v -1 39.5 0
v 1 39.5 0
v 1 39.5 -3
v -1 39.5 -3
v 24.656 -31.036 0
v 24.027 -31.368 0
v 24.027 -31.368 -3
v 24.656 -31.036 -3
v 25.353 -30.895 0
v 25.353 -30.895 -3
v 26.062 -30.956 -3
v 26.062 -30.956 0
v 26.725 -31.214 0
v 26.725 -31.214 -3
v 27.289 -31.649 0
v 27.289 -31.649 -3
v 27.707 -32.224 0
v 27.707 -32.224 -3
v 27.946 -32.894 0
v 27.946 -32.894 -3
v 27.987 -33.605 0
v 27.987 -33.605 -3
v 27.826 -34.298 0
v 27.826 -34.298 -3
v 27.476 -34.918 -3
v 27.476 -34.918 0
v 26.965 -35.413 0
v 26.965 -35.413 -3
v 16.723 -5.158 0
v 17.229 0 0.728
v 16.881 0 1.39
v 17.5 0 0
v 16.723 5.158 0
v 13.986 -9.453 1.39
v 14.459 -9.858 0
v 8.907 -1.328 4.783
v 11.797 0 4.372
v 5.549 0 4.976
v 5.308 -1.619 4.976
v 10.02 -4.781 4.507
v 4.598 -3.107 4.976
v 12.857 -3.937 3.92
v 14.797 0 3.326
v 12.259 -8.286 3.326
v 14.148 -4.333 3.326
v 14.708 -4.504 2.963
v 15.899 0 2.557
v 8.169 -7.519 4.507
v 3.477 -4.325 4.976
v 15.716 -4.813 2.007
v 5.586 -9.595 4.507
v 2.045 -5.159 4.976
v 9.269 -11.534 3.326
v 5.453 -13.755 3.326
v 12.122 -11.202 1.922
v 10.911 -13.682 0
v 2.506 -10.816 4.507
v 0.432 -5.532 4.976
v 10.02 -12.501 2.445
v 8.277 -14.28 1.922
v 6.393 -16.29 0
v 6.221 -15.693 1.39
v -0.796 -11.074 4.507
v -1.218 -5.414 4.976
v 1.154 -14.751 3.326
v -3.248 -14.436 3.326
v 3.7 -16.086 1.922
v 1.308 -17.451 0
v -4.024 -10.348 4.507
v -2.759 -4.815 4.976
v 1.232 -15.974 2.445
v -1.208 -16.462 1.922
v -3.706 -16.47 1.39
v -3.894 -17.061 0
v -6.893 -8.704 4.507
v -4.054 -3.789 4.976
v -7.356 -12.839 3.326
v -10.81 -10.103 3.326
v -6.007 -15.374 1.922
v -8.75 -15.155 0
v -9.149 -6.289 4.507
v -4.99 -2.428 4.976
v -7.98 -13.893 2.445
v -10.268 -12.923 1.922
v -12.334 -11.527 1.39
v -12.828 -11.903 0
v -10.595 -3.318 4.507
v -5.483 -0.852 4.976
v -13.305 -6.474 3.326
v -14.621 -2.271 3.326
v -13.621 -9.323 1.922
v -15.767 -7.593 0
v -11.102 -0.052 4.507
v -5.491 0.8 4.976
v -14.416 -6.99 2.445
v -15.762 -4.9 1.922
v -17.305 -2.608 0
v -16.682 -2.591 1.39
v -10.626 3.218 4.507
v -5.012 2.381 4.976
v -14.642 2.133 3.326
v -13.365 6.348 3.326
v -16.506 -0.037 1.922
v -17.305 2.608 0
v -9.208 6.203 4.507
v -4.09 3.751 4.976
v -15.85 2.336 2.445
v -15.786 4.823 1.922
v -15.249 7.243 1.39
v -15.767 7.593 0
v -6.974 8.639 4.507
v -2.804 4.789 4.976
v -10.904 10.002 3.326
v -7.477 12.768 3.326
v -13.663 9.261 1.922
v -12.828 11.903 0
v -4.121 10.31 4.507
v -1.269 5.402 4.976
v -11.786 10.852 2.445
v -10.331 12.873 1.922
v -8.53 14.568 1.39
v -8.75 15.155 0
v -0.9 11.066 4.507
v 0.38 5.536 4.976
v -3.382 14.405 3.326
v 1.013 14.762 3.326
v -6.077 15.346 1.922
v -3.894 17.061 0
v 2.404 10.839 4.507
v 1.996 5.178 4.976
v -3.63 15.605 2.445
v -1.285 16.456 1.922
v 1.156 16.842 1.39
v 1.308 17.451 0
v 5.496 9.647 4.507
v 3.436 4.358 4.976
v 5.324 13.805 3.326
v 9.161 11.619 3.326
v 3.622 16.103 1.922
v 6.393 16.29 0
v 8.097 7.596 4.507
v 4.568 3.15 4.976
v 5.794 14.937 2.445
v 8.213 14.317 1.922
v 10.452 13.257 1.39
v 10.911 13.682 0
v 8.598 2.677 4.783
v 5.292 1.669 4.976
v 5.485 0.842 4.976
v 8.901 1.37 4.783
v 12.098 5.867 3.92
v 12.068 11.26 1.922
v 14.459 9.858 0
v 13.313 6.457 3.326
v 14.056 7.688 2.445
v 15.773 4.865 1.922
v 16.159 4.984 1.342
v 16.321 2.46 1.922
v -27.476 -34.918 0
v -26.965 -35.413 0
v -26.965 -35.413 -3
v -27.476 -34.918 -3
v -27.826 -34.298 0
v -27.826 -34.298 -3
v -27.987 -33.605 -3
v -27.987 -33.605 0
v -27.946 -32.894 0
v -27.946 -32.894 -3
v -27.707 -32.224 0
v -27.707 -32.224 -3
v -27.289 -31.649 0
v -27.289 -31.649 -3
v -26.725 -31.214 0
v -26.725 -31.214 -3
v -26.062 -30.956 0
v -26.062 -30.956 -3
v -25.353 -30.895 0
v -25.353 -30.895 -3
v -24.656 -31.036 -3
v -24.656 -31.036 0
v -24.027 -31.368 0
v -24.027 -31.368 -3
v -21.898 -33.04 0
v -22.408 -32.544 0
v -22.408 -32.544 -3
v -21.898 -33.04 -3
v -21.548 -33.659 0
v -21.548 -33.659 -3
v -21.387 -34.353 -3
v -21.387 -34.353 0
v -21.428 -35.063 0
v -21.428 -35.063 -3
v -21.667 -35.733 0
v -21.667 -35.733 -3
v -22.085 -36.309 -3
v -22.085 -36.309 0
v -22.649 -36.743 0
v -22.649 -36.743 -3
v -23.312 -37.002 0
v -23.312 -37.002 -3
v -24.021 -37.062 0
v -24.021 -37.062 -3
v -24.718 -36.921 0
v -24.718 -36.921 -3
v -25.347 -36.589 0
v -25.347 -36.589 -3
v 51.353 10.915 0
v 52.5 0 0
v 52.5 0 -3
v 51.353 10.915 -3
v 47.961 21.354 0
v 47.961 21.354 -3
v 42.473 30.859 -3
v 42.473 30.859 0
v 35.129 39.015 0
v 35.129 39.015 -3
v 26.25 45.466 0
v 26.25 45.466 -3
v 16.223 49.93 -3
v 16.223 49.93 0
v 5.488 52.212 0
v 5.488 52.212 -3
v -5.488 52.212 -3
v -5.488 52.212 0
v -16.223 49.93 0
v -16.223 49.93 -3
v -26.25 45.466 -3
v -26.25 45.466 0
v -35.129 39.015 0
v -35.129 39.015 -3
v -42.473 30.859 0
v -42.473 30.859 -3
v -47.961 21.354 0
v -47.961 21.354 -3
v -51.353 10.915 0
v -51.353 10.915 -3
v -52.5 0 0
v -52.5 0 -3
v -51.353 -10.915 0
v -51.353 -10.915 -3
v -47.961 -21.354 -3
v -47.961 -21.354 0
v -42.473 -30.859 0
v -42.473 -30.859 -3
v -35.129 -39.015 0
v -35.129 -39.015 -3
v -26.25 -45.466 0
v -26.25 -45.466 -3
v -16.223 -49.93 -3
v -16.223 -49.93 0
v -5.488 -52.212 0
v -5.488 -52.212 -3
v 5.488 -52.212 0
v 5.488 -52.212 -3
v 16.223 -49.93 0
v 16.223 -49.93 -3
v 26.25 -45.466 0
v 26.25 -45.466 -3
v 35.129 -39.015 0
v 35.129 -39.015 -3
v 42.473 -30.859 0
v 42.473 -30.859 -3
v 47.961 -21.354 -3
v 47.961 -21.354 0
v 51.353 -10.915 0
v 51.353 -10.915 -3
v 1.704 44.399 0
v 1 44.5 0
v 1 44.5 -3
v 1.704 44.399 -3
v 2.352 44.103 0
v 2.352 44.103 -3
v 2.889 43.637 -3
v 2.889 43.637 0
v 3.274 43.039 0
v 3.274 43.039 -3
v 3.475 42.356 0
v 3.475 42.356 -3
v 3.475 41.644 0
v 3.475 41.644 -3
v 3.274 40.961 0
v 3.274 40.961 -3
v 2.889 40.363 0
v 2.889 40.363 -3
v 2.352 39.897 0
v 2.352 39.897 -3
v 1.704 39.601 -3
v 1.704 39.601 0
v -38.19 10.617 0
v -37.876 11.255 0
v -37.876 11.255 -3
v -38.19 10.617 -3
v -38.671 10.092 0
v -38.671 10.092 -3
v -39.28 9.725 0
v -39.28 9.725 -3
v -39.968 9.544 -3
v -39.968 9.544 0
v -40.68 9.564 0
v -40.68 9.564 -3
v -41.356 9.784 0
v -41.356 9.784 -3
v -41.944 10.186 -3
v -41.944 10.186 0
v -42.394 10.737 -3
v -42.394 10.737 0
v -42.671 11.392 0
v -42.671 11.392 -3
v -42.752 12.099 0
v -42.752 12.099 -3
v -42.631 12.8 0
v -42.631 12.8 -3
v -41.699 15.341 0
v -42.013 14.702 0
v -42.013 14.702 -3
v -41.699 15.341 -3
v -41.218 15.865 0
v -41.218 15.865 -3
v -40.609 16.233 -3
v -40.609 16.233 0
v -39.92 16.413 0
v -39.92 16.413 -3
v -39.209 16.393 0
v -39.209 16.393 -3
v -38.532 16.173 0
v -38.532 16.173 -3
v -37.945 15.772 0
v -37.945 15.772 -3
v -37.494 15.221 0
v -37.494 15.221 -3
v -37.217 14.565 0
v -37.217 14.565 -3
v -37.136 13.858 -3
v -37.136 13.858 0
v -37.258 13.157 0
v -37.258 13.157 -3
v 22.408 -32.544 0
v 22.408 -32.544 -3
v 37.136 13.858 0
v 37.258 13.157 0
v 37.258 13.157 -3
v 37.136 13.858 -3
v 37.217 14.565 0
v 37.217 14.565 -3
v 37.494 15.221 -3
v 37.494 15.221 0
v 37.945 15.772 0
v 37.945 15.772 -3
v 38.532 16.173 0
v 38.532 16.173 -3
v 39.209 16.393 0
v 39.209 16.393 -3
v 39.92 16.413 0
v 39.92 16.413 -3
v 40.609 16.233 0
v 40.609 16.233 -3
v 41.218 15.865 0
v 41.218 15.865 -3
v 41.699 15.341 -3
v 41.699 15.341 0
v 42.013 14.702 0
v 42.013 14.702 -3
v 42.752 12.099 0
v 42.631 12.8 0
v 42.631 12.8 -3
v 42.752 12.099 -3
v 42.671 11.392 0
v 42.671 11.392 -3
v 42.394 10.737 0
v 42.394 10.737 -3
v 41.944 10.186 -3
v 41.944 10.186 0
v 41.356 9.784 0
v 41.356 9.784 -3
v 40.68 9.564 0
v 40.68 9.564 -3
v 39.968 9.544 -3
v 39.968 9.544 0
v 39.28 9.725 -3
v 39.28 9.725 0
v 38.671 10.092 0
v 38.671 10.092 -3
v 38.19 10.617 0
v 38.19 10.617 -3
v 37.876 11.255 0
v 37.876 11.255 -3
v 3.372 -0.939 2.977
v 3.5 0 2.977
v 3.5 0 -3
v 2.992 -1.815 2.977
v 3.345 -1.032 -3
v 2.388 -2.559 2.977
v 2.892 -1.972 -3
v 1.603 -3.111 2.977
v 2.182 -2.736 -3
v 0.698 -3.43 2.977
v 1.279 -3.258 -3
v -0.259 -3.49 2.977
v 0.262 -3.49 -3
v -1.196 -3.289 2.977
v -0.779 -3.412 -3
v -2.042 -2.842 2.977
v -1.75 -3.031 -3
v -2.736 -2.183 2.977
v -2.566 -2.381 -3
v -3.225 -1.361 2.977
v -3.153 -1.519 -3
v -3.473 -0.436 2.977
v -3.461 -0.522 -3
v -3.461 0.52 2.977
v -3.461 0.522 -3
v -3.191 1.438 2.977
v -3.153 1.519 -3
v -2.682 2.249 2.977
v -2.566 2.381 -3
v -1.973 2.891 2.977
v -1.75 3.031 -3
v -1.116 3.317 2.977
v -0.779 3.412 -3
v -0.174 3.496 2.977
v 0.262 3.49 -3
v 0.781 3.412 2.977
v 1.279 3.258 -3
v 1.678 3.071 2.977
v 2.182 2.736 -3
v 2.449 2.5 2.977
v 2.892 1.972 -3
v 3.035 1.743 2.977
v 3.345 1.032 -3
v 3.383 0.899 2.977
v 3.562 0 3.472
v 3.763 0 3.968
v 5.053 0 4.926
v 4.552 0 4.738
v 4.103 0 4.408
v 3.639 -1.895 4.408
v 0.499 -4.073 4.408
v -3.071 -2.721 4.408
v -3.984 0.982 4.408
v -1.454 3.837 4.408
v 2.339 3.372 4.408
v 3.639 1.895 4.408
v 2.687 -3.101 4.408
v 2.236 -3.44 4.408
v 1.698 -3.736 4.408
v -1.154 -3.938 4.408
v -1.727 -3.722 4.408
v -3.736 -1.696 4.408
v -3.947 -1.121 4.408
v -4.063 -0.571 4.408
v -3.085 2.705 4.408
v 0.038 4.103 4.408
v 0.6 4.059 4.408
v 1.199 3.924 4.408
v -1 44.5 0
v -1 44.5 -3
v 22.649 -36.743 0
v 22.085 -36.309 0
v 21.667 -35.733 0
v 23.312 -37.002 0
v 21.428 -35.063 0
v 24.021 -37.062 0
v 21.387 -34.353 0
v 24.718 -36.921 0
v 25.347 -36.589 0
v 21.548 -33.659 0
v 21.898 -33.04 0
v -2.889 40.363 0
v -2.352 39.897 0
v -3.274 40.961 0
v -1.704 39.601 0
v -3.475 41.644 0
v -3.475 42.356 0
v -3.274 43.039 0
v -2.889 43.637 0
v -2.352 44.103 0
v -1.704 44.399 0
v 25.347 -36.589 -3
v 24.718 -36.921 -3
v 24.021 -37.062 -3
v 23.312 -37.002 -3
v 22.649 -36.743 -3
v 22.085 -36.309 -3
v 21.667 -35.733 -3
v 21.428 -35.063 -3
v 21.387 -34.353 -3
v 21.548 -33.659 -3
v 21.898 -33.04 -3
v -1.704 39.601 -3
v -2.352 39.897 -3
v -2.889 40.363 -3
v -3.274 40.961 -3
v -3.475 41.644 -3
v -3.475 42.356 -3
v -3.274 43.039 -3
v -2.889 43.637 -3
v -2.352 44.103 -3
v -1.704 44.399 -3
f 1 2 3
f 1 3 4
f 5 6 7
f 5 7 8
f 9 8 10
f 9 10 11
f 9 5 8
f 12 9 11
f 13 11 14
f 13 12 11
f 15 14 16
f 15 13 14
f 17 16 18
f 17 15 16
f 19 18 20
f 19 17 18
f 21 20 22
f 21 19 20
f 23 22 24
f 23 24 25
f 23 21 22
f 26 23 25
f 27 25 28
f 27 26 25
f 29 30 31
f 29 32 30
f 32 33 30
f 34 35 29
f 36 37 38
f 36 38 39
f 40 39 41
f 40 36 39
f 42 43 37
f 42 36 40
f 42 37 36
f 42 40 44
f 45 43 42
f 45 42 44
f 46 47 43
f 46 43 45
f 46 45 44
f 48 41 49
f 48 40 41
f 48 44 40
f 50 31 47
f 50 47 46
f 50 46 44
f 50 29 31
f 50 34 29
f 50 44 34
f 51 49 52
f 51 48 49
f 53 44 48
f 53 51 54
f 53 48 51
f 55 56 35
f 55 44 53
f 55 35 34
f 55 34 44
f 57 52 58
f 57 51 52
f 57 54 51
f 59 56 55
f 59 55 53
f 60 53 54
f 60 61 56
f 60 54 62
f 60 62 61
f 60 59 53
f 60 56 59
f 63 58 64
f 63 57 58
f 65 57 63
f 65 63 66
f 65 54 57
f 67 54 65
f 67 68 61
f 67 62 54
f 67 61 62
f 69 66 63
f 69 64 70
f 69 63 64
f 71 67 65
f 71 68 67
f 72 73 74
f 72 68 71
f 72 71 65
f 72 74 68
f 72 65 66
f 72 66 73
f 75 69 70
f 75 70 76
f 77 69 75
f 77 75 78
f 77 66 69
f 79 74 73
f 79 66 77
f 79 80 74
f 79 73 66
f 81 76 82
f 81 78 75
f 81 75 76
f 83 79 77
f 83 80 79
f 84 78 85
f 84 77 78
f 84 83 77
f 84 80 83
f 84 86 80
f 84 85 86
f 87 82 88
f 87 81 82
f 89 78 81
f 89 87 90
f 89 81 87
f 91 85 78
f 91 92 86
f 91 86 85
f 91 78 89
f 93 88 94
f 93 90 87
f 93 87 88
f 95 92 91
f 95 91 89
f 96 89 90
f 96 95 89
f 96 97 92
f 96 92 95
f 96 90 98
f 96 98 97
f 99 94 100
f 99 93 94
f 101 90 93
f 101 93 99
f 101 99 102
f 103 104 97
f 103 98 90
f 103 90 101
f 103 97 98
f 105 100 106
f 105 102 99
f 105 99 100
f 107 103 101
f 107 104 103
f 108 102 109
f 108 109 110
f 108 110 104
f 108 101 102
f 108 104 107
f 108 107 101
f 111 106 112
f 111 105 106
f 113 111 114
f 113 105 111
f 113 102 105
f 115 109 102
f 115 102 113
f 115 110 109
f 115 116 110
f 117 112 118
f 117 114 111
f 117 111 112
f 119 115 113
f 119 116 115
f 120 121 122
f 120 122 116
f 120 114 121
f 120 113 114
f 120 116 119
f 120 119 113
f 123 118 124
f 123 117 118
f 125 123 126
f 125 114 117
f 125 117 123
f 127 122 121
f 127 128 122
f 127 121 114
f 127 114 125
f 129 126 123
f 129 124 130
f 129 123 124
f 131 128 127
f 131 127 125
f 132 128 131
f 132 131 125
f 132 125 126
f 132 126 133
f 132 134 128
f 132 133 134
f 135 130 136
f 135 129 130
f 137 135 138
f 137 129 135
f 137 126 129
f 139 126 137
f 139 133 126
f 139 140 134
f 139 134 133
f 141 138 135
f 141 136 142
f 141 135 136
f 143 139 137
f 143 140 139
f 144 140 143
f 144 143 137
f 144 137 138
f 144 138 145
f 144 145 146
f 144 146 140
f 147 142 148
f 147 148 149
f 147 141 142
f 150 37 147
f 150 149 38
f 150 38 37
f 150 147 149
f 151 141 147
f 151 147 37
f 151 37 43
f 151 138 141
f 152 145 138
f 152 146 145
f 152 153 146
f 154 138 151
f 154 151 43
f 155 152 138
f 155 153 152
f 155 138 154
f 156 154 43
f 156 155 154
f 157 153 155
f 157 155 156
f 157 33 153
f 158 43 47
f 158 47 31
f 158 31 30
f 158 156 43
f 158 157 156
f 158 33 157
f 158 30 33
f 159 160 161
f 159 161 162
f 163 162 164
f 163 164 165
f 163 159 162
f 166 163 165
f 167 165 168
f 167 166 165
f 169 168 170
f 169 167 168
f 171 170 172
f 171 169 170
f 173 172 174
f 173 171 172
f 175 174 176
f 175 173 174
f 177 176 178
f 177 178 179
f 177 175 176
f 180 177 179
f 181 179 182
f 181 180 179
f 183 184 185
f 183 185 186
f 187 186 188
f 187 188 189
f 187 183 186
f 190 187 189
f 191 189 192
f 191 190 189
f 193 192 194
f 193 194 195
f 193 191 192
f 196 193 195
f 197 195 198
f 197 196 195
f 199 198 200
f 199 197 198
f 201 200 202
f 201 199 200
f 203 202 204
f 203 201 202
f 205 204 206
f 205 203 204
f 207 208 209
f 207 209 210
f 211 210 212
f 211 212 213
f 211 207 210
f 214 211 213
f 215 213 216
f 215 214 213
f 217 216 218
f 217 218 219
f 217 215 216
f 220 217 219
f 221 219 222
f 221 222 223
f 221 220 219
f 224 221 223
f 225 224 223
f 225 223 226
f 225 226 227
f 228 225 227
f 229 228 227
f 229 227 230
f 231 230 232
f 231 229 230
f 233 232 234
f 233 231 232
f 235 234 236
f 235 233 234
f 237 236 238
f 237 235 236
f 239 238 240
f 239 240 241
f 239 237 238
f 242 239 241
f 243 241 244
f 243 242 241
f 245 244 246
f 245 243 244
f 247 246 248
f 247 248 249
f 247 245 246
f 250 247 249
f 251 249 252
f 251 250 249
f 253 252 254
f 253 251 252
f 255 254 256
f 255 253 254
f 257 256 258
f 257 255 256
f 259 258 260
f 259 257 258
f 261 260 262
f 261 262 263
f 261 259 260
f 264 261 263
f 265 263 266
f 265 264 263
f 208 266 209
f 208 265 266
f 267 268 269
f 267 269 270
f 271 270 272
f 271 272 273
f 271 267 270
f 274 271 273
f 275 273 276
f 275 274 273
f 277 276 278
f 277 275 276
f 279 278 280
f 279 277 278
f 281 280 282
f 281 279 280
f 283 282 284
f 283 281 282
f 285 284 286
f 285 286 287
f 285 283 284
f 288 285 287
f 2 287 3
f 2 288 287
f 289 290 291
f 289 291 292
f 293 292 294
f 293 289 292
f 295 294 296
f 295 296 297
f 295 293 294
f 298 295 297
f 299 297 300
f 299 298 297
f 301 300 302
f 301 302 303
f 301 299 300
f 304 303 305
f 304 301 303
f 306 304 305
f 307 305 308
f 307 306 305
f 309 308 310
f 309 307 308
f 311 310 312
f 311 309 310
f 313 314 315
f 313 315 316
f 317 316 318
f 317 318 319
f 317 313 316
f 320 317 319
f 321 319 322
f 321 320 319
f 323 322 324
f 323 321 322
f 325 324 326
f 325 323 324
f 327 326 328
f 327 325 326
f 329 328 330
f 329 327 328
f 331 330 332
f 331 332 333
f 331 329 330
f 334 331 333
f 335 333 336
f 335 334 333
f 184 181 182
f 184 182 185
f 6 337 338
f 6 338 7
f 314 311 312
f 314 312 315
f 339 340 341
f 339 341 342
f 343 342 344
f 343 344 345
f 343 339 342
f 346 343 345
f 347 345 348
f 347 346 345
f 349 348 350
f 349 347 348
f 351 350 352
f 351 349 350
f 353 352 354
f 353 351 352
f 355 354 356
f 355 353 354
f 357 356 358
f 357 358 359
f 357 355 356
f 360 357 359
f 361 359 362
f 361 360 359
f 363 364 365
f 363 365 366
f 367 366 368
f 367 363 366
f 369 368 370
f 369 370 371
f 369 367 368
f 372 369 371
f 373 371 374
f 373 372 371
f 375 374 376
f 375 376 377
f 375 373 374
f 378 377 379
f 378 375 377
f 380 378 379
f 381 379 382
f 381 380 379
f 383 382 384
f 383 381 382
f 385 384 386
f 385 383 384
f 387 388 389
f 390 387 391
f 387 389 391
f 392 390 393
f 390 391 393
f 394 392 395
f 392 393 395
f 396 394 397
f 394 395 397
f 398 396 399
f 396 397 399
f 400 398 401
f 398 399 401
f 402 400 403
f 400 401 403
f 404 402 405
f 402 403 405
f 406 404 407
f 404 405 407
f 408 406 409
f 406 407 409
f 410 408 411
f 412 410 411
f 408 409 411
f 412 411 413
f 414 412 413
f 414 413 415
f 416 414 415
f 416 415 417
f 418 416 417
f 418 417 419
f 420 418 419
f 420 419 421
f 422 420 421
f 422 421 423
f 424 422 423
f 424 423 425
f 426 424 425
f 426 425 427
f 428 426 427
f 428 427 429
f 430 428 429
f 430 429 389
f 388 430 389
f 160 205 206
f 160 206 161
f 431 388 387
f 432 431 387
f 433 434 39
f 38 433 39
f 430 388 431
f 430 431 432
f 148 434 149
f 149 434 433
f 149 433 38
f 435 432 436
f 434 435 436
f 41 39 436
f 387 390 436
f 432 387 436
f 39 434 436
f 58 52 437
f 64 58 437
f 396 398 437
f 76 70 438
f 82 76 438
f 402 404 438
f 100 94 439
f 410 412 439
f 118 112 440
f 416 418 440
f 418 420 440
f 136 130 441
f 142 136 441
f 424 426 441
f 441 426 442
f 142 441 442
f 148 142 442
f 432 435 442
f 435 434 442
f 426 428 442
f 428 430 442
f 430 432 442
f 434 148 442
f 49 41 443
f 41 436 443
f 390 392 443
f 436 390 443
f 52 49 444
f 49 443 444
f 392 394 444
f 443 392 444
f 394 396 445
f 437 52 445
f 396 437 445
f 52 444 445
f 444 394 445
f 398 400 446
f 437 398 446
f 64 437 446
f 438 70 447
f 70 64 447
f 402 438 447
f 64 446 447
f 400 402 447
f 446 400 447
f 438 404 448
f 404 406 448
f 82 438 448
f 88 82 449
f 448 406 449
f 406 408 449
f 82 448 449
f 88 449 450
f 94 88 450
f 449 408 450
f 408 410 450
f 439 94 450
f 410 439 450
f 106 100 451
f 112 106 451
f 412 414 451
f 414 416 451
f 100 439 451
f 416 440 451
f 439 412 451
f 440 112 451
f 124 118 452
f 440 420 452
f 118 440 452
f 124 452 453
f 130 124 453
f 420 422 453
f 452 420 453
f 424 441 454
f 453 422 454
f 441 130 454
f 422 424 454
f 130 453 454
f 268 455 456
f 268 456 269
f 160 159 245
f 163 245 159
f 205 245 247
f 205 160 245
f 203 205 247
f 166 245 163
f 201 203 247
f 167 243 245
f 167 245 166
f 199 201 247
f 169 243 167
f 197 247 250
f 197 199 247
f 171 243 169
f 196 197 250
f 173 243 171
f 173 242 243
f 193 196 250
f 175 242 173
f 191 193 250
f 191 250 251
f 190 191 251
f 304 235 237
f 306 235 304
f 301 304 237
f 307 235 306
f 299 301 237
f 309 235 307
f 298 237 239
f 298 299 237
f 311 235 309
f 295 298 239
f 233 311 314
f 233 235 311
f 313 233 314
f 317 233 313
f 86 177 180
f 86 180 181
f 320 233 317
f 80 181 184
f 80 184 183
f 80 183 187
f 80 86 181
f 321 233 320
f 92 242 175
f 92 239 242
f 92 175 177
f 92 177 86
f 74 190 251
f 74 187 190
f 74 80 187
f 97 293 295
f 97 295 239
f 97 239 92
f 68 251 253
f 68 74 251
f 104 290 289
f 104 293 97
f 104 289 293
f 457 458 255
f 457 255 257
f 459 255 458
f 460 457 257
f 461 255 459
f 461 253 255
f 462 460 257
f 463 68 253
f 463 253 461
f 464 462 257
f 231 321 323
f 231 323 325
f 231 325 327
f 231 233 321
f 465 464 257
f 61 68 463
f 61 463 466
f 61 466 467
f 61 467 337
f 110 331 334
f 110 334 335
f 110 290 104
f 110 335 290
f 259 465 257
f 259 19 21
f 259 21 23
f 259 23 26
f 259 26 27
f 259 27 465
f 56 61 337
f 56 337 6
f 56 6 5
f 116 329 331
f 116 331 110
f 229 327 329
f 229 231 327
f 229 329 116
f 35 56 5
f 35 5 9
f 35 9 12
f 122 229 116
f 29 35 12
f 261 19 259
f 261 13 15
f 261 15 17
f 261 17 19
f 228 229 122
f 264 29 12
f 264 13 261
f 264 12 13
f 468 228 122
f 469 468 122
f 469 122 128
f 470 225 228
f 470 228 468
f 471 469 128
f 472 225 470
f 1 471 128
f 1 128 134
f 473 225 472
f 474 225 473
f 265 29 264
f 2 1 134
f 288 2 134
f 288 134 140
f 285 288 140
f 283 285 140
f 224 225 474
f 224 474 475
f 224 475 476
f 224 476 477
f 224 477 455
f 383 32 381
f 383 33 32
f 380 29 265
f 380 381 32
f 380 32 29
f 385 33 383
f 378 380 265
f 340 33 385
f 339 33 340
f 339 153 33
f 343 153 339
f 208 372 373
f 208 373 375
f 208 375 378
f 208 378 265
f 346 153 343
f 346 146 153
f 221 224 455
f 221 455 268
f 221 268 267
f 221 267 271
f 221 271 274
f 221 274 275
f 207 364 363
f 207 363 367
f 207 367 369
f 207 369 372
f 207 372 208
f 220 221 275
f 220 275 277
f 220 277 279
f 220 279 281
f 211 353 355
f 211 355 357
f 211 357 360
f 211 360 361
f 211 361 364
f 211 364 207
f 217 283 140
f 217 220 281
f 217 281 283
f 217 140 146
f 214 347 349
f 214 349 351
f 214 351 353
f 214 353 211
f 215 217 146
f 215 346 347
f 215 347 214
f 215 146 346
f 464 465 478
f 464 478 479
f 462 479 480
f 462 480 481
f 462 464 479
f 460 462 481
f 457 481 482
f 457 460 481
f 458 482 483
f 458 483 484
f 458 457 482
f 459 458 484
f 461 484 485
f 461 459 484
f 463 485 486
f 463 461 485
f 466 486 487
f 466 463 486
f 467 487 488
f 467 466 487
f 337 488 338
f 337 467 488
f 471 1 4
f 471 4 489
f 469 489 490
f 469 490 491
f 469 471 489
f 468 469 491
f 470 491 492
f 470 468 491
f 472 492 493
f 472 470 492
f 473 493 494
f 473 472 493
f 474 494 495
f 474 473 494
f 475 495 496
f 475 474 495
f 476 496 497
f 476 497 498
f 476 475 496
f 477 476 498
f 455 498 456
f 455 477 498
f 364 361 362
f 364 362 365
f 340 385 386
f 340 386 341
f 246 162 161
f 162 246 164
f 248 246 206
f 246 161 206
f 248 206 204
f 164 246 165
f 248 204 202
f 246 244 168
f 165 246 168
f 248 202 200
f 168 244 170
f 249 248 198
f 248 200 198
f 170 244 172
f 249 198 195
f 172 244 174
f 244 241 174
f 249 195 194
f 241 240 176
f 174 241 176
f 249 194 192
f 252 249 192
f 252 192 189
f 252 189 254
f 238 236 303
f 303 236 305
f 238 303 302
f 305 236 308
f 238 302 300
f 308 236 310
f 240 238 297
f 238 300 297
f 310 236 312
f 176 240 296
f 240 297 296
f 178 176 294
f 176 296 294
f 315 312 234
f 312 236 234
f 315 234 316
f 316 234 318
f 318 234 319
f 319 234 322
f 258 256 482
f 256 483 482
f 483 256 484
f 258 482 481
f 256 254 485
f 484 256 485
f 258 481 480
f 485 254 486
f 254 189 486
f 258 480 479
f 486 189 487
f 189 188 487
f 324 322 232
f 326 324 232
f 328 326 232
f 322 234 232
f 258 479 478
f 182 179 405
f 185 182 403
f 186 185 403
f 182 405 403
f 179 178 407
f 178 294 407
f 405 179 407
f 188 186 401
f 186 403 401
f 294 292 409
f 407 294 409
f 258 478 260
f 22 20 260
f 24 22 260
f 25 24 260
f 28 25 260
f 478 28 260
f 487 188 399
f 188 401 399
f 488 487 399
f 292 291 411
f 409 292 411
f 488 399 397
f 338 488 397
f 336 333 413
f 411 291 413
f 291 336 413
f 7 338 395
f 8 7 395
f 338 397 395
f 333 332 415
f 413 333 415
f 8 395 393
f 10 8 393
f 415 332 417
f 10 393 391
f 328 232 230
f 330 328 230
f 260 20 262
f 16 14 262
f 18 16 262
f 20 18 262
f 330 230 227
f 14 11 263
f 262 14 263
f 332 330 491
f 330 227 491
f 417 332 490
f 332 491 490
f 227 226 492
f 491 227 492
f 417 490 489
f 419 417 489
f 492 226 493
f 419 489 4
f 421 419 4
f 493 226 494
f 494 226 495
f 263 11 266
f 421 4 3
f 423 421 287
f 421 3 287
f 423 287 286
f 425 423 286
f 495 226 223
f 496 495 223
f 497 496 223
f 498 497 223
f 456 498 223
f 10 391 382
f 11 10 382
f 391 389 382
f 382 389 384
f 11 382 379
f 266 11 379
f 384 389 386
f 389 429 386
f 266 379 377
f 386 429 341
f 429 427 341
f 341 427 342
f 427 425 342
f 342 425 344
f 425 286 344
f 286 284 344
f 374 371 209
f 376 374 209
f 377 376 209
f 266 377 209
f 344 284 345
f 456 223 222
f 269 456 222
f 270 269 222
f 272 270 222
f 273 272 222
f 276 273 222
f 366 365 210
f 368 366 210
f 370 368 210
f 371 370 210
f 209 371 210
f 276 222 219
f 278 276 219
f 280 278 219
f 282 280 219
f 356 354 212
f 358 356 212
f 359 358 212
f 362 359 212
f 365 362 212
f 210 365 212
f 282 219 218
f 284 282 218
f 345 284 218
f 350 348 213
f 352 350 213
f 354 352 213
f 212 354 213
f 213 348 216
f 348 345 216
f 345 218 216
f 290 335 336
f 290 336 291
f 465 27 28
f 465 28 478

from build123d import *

# Parameters (mm, degrees)
F0_R     = 52.5
F0_R_2   = 17.5
F0_R_3   = 3.5
F1_DEPTH = 3
F4_R     = 2


with BuildPart() as f1:
    # F0 (on Top) → F1 (new body)
    with BuildSketch(Plane.XY):
        Circle(F0_R)
        with BuildLine():
            ThreePointArc((-22.4085, -32.543957), (-21.855421, -36.035962), (-25.347427, -36.589042))
            Line((-25.347427, -36.589042), (-26.965461, -35.413471))
            ThreePointArc((-26.965461, -35.413471), (-27.51854, -31.921465), (-24.026534, -31.368386))
            Line((-24.026534, -31.368386), (-22.4085, -32.543957))
        make_face(mode=Mode.SUBTRACT)
        with BuildLine():
            ThreePointArc((24.026534, -31.368386), (27.51854, -31.921465), (26.965461, -35.413471))
            Line((26.965461, -35.413471), (25.347427, -36.589042))
            ThreePointArc((25.347427, -36.589042), (21.855421, -36.035962), (22.4085, -32.543957))
            Line((22.4085, -32.543957), (24.026534, -31.368386))
        make_face(mode=Mode.SUBTRACT)
        with BuildLine():
            ThreePointArc((-37.875749, 11.255115), (-41.025933, 9.650016), (-42.631032, 12.8002))
            Line((-42.631032, 12.8002), (-42.012998, 14.702313))
            ThreePointArc((-42.012998, 14.702313), (-38.862814, 16.307412), (-37.257715, 13.157228))
            Line((-37.257715, 13.157228), (-37.875749, 11.255115))
        make_face(mode=Mode.SUBTRACT)
        Circle(F0_R_2, mode=Mode.SUBTRACT)
        with BuildLine():
            ThreePointArc((37.257715, 13.157228), (38.862814, 16.307412), (42.012998, 14.702313))
            Line((42.012998, 14.702313), (42.631032, 12.8002))
            ThreePointArc((42.631032, 12.8002), (41.025933, 9.650016), (37.875749, 11.255115))
            Line((37.875749, 11.255115), (37.257715, 13.157228))
        make_face(mode=Mode.SUBTRACT)
        with BuildLine():
            ThreePointArc((-1, 39.5), (-3.5, 42), (-1, 44.5))
            Line((-1, 44.5), (1, 44.5))
            ThreePointArc((1, 44.5), (3.5, 42), (1, 39.5))
            Line((1, 39.5), (-1, 39.5))
        make_face(mode=Mode.SUBTRACT)
        Circle(F0_R_2)
        Circle(F0_R_3, mode=Mode.SUBTRACT)
    extrude(amount=-F1_DEPTH)

    # F2 (on Front) → F3 (revolve)
    with BuildSketch(Plane.XZ):
        with BuildLine():
            Line((3.5, 5), (3.5, 0))
            Line((3.5, 0), (17.5, 0))
            add(Edge.make_bspline(
                [(3.5, 5), (12.593206, 5), (16.342813, 3.758031), (17.5, 0)],
                knots=[0, 0, 0, 0, 14.866069, 14.866069, 14.866069, 14.866069], degree=3))
        make_face()
    revolve(axis=Axis((0, 0, 2.5), (0, 0, -1)))

    # F4
    f4_edges = [f1.edges().sort_by_distance(p)[0] for p in [
        (-3.5, 0, 5),
    ]]
    fillet(f4_edges, radius=F4_R)


solid = f1.part
